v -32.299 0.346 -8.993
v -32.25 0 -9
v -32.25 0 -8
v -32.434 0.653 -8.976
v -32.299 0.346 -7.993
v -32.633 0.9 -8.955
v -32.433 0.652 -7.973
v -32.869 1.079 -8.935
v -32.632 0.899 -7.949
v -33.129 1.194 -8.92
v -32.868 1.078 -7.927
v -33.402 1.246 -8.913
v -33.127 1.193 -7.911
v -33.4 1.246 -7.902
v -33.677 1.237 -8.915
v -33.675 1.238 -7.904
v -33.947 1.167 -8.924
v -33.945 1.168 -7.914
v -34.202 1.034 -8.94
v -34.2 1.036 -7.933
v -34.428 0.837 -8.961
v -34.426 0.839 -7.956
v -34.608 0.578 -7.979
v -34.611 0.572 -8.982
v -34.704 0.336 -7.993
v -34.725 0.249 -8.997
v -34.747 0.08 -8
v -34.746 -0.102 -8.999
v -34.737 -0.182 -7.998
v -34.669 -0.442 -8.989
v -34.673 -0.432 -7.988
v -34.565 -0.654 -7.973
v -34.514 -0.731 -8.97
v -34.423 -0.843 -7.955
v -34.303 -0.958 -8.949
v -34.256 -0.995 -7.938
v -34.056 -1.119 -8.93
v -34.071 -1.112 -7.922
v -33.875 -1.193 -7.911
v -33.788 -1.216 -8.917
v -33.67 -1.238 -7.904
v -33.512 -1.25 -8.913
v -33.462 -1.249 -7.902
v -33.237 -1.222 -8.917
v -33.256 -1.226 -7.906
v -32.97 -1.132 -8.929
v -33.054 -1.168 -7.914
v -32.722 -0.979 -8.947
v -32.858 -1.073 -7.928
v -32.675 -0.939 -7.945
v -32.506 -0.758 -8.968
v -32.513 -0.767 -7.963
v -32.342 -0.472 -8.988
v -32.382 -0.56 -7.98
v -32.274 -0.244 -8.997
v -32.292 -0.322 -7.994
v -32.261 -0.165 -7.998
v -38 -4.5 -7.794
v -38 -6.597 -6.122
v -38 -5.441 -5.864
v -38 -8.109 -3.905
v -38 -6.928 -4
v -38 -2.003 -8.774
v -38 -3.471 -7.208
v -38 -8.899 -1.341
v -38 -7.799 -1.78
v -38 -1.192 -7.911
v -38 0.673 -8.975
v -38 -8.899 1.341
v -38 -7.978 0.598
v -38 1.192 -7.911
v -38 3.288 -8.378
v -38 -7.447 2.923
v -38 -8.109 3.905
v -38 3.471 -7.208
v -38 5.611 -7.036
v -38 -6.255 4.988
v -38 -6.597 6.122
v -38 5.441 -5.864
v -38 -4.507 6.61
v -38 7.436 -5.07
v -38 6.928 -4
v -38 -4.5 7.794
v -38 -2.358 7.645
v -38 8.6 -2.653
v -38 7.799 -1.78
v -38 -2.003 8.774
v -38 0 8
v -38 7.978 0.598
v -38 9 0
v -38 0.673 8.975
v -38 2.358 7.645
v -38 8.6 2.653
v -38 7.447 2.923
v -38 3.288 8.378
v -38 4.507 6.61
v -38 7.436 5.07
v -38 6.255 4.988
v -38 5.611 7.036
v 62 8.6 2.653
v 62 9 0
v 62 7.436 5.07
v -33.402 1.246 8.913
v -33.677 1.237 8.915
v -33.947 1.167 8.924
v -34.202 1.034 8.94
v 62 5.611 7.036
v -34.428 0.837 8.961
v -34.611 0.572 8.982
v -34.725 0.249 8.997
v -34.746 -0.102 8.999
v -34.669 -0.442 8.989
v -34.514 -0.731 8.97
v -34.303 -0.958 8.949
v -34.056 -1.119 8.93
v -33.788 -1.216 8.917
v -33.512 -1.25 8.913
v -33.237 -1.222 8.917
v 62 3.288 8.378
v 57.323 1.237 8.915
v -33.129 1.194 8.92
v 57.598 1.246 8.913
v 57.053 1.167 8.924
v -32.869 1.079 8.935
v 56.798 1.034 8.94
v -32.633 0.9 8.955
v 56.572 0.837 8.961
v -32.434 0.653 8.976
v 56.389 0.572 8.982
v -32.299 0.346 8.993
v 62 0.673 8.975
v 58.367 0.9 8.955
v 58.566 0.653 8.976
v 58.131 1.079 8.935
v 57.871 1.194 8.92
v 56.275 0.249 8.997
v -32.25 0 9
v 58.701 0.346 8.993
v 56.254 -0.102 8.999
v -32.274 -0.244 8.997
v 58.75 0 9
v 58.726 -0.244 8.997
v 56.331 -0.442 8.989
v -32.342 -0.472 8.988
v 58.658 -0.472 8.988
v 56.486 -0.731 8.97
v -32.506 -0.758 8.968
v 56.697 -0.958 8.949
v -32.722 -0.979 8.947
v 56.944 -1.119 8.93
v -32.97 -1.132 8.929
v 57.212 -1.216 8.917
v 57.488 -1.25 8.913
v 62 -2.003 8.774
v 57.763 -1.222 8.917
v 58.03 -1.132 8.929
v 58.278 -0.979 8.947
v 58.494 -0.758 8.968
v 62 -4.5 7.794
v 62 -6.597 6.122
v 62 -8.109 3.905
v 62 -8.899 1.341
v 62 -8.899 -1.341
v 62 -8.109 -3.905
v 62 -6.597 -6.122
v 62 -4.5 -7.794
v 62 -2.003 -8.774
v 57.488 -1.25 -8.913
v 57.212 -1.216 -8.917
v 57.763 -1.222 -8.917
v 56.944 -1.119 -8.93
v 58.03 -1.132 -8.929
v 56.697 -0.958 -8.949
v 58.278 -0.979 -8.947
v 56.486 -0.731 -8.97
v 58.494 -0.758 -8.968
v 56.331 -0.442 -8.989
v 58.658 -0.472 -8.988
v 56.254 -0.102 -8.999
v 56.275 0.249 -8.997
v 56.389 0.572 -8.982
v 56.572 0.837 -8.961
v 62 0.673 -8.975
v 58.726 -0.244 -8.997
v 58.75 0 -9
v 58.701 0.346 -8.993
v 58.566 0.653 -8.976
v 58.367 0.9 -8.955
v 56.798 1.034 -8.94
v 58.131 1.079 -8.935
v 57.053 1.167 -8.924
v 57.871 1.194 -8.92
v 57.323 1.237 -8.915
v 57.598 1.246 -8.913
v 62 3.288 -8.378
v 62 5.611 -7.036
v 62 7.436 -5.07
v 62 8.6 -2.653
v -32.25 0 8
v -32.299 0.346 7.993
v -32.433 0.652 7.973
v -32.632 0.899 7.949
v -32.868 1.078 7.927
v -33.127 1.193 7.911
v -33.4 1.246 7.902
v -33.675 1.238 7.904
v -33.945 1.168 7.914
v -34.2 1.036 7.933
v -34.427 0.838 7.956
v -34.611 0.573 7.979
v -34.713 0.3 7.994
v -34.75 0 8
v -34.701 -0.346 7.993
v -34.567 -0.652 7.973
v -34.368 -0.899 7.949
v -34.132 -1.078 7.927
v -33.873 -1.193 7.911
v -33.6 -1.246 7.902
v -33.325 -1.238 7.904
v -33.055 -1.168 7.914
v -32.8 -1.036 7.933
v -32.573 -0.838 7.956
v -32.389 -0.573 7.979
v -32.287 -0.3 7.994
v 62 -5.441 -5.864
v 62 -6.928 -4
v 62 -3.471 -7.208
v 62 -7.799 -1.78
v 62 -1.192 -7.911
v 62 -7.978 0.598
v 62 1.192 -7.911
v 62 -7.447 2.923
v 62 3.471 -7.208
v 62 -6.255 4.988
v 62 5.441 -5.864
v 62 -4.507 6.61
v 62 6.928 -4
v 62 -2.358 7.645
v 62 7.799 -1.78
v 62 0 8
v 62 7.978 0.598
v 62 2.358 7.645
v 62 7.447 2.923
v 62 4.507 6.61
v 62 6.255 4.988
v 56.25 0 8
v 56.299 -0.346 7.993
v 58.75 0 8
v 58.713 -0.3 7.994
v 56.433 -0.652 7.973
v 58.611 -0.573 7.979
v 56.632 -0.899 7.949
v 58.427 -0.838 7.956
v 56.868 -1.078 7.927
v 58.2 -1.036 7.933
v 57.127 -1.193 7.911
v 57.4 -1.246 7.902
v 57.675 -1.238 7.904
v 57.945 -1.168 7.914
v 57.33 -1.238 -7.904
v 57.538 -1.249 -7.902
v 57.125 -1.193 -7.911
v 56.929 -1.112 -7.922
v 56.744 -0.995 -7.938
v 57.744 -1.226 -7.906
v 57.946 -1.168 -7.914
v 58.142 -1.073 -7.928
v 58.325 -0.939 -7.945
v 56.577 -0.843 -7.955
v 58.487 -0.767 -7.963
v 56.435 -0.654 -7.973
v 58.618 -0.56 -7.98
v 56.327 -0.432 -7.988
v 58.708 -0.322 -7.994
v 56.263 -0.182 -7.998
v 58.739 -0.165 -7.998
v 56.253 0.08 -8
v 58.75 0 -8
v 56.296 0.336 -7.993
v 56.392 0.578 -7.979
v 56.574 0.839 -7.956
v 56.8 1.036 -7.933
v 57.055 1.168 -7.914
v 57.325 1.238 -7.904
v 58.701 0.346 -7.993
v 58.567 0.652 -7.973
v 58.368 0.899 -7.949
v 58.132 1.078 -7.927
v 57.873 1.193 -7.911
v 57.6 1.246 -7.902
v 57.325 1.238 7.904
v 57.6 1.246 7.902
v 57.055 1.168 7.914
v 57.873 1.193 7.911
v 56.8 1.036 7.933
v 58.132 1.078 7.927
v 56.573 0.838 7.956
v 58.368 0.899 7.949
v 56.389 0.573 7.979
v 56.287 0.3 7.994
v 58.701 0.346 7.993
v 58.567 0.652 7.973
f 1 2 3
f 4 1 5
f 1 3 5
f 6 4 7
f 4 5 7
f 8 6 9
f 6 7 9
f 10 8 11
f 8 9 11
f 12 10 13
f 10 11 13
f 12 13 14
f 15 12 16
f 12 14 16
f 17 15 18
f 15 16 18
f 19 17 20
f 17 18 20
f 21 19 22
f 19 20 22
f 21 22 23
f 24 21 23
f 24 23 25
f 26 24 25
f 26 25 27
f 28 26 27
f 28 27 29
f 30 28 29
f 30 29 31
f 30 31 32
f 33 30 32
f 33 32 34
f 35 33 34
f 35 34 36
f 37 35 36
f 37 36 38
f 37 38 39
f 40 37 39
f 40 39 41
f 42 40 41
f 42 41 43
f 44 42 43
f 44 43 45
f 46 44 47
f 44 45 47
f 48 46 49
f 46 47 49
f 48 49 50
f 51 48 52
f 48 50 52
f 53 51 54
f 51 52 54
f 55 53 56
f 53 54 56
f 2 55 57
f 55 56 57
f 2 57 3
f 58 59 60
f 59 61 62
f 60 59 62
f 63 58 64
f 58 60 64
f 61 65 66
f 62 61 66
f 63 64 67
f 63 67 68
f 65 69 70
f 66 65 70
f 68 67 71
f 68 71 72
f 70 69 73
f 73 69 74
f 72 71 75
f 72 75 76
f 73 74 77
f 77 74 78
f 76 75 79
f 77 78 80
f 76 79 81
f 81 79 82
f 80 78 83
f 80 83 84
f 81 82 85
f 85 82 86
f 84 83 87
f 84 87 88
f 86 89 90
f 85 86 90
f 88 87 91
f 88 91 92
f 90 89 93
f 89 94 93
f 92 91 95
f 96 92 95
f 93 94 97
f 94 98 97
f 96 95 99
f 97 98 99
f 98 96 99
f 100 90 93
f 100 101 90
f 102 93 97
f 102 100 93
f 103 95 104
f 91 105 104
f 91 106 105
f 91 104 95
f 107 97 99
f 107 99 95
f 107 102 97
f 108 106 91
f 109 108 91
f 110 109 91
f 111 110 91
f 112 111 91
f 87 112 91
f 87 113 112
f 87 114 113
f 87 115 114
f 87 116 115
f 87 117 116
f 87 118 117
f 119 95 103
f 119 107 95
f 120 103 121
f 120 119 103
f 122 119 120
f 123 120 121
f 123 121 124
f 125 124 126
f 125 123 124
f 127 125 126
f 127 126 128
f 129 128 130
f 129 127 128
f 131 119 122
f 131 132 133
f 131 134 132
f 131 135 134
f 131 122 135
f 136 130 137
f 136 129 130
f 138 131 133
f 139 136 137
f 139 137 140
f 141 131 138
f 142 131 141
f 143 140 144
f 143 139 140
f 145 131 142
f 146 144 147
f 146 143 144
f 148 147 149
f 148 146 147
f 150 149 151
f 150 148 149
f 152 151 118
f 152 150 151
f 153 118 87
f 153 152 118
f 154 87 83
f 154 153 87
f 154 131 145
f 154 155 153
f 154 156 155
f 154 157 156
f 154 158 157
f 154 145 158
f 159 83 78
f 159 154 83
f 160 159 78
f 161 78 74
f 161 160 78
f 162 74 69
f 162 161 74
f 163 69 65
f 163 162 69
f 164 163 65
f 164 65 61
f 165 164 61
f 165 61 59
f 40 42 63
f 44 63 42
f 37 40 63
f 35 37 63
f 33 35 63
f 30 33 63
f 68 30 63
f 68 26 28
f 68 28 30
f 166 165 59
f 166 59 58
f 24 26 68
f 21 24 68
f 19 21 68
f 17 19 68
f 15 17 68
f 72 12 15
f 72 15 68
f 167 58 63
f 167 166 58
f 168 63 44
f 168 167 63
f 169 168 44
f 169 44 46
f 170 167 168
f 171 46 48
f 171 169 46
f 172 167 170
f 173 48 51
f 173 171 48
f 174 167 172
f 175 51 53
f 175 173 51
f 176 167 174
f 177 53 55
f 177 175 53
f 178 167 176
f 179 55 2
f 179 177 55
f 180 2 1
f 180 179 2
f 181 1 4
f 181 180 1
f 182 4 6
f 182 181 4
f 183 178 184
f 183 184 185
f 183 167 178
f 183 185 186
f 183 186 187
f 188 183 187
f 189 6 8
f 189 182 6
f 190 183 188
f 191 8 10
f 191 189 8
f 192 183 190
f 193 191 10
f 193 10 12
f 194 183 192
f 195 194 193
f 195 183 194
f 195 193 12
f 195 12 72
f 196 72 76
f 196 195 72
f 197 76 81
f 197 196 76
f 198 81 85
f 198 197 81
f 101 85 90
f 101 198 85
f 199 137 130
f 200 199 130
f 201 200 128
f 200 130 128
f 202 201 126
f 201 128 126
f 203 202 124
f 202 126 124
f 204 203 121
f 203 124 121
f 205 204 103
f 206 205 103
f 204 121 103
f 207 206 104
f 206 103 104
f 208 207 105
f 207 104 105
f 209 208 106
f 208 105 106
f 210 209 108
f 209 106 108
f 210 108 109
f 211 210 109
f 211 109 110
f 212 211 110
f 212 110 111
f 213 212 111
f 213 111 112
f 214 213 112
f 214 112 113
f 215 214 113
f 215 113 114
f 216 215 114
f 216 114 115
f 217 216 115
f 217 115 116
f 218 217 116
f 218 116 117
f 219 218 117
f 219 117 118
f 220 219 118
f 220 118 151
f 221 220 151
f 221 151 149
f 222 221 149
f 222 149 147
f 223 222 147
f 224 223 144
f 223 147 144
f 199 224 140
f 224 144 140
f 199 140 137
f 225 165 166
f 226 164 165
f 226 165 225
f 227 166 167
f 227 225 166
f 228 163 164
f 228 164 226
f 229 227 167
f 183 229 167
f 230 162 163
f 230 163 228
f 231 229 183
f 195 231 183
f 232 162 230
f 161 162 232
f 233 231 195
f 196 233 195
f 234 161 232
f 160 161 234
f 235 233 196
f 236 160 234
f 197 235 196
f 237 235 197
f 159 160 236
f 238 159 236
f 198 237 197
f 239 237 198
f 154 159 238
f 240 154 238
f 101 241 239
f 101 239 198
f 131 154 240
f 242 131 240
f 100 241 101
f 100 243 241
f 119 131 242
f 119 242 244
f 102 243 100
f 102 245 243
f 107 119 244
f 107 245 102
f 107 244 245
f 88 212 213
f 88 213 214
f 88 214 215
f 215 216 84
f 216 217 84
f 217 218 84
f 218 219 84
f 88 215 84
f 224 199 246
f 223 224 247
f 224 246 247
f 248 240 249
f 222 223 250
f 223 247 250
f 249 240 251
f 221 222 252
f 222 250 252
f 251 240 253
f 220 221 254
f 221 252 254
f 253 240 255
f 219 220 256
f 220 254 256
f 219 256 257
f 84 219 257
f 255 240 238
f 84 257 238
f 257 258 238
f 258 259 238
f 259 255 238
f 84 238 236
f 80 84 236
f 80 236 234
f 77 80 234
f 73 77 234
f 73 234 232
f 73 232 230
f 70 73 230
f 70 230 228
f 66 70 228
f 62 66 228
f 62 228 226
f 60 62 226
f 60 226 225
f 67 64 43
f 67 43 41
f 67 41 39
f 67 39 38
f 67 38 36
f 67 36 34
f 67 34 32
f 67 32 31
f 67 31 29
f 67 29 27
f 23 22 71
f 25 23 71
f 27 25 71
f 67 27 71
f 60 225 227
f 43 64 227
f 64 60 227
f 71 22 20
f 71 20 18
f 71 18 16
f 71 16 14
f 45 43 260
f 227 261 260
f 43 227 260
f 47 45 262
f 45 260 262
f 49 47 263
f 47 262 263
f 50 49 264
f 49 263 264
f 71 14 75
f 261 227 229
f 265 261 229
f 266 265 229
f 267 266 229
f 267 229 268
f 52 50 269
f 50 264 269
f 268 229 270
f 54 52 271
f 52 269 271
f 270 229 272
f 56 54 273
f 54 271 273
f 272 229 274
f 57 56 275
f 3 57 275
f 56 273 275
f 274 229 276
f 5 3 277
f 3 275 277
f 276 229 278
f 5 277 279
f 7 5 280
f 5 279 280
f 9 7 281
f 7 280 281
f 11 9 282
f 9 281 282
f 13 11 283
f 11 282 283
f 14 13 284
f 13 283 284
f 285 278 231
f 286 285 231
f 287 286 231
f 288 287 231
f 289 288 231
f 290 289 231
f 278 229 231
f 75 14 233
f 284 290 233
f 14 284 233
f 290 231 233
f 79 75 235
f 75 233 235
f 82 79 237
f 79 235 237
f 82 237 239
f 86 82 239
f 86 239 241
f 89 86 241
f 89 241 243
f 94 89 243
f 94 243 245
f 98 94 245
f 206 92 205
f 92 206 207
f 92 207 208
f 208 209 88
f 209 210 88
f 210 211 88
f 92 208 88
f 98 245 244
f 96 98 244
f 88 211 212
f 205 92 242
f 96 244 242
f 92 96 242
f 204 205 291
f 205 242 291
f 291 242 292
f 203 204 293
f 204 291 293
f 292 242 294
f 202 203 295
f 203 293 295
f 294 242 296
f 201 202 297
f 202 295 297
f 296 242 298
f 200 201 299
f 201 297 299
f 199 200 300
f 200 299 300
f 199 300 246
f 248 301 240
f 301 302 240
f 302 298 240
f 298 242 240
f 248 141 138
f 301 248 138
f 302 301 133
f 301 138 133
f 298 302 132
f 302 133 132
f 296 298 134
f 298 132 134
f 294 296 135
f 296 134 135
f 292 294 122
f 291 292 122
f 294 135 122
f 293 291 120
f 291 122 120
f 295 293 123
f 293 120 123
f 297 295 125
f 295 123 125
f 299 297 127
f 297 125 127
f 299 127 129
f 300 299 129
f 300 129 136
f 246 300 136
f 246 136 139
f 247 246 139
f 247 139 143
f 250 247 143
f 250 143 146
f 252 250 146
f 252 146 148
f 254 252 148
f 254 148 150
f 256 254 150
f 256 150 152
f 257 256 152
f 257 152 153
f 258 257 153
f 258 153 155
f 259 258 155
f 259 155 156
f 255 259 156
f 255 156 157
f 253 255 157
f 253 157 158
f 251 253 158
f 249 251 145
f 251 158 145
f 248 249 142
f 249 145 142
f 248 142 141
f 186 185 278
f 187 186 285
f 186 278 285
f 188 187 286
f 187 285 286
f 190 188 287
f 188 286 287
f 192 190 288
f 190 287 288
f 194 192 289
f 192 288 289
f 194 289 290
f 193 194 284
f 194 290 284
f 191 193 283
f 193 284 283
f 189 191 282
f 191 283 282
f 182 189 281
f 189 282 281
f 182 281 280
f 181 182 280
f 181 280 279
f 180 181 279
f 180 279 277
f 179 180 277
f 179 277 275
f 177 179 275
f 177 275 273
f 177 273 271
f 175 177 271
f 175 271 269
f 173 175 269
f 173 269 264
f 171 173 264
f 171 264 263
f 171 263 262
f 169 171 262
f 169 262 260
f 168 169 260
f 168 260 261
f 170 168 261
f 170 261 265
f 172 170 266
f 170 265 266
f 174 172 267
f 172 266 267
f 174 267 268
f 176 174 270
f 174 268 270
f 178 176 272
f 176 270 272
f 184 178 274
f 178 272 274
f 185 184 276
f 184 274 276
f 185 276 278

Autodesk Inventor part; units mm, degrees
ref_plane "YZ Plane" through (0, 0, 0) normal (1, 0, 0) x (0, 1, 0)
ref_plane "XZ Plane" through (0, 0, 0) normal (0, 1, 0) x (-1, 0, 0)
sketch "ShaftProfile" plane through (0, 0, 0) normal (0, 0, 1) x (1, 0, 0)
  line L0 (-58, 0) -> (82, 0) construction
  line L1 (-38, 9) -> (62, 9)
  line L2 (62, 9) -> (62, 0)
  line L3 (-38, 0) -> (-38, 9)
  line L4 (-38, 0) -> (62, 0)
  point P0 (0, 0)
  dimension "d1" = 100
  dimension "d2" = 9
  dimension "d4" = 38
revolve "ShaftFeature" add sketch "ShaftProfile" angle 360 about axis through (-38, 0, 0) along (1, 0, 0)
sketch "Sketch2" plane through (-38, 0, 0) normal (-1, 0, 0) x (0, 0, 1)
  circle A0 centre (0, 0) radius 9 projected
hole "ShaftHoleFeature" at (-38, 0, 0) direction (1, 0, 0) diameter 16 end through all
ref_plane "MidSidePlane" through (0, 0, 10) normal (0, 0, 1) x (1, 0, 0)
sketch "CapHoles" plane through (0, 0, 10) normal (0, 0, 1) x (1, 0, 0)
  line L0 (62, -9) -> (62, 9) construction
  line L1 (-38, -9) -> (-38, 9) construction
  line L2 (-48, 0) -> (22, 0) construction
  circle A0 centre (-33.5, 0) radius 1.25
  circle A1 centre (57.5, 0) radius 1.25
  dimension "d24" = 2.5
  dimension "d25" = 4.5
  dimension "d26" = 4.5
extrude "CapHolesFeature" cut sketch "CapHoles" against normal through all
equation "\"d26\" = d25"
properties part number "BackPair1PistonShaft"
